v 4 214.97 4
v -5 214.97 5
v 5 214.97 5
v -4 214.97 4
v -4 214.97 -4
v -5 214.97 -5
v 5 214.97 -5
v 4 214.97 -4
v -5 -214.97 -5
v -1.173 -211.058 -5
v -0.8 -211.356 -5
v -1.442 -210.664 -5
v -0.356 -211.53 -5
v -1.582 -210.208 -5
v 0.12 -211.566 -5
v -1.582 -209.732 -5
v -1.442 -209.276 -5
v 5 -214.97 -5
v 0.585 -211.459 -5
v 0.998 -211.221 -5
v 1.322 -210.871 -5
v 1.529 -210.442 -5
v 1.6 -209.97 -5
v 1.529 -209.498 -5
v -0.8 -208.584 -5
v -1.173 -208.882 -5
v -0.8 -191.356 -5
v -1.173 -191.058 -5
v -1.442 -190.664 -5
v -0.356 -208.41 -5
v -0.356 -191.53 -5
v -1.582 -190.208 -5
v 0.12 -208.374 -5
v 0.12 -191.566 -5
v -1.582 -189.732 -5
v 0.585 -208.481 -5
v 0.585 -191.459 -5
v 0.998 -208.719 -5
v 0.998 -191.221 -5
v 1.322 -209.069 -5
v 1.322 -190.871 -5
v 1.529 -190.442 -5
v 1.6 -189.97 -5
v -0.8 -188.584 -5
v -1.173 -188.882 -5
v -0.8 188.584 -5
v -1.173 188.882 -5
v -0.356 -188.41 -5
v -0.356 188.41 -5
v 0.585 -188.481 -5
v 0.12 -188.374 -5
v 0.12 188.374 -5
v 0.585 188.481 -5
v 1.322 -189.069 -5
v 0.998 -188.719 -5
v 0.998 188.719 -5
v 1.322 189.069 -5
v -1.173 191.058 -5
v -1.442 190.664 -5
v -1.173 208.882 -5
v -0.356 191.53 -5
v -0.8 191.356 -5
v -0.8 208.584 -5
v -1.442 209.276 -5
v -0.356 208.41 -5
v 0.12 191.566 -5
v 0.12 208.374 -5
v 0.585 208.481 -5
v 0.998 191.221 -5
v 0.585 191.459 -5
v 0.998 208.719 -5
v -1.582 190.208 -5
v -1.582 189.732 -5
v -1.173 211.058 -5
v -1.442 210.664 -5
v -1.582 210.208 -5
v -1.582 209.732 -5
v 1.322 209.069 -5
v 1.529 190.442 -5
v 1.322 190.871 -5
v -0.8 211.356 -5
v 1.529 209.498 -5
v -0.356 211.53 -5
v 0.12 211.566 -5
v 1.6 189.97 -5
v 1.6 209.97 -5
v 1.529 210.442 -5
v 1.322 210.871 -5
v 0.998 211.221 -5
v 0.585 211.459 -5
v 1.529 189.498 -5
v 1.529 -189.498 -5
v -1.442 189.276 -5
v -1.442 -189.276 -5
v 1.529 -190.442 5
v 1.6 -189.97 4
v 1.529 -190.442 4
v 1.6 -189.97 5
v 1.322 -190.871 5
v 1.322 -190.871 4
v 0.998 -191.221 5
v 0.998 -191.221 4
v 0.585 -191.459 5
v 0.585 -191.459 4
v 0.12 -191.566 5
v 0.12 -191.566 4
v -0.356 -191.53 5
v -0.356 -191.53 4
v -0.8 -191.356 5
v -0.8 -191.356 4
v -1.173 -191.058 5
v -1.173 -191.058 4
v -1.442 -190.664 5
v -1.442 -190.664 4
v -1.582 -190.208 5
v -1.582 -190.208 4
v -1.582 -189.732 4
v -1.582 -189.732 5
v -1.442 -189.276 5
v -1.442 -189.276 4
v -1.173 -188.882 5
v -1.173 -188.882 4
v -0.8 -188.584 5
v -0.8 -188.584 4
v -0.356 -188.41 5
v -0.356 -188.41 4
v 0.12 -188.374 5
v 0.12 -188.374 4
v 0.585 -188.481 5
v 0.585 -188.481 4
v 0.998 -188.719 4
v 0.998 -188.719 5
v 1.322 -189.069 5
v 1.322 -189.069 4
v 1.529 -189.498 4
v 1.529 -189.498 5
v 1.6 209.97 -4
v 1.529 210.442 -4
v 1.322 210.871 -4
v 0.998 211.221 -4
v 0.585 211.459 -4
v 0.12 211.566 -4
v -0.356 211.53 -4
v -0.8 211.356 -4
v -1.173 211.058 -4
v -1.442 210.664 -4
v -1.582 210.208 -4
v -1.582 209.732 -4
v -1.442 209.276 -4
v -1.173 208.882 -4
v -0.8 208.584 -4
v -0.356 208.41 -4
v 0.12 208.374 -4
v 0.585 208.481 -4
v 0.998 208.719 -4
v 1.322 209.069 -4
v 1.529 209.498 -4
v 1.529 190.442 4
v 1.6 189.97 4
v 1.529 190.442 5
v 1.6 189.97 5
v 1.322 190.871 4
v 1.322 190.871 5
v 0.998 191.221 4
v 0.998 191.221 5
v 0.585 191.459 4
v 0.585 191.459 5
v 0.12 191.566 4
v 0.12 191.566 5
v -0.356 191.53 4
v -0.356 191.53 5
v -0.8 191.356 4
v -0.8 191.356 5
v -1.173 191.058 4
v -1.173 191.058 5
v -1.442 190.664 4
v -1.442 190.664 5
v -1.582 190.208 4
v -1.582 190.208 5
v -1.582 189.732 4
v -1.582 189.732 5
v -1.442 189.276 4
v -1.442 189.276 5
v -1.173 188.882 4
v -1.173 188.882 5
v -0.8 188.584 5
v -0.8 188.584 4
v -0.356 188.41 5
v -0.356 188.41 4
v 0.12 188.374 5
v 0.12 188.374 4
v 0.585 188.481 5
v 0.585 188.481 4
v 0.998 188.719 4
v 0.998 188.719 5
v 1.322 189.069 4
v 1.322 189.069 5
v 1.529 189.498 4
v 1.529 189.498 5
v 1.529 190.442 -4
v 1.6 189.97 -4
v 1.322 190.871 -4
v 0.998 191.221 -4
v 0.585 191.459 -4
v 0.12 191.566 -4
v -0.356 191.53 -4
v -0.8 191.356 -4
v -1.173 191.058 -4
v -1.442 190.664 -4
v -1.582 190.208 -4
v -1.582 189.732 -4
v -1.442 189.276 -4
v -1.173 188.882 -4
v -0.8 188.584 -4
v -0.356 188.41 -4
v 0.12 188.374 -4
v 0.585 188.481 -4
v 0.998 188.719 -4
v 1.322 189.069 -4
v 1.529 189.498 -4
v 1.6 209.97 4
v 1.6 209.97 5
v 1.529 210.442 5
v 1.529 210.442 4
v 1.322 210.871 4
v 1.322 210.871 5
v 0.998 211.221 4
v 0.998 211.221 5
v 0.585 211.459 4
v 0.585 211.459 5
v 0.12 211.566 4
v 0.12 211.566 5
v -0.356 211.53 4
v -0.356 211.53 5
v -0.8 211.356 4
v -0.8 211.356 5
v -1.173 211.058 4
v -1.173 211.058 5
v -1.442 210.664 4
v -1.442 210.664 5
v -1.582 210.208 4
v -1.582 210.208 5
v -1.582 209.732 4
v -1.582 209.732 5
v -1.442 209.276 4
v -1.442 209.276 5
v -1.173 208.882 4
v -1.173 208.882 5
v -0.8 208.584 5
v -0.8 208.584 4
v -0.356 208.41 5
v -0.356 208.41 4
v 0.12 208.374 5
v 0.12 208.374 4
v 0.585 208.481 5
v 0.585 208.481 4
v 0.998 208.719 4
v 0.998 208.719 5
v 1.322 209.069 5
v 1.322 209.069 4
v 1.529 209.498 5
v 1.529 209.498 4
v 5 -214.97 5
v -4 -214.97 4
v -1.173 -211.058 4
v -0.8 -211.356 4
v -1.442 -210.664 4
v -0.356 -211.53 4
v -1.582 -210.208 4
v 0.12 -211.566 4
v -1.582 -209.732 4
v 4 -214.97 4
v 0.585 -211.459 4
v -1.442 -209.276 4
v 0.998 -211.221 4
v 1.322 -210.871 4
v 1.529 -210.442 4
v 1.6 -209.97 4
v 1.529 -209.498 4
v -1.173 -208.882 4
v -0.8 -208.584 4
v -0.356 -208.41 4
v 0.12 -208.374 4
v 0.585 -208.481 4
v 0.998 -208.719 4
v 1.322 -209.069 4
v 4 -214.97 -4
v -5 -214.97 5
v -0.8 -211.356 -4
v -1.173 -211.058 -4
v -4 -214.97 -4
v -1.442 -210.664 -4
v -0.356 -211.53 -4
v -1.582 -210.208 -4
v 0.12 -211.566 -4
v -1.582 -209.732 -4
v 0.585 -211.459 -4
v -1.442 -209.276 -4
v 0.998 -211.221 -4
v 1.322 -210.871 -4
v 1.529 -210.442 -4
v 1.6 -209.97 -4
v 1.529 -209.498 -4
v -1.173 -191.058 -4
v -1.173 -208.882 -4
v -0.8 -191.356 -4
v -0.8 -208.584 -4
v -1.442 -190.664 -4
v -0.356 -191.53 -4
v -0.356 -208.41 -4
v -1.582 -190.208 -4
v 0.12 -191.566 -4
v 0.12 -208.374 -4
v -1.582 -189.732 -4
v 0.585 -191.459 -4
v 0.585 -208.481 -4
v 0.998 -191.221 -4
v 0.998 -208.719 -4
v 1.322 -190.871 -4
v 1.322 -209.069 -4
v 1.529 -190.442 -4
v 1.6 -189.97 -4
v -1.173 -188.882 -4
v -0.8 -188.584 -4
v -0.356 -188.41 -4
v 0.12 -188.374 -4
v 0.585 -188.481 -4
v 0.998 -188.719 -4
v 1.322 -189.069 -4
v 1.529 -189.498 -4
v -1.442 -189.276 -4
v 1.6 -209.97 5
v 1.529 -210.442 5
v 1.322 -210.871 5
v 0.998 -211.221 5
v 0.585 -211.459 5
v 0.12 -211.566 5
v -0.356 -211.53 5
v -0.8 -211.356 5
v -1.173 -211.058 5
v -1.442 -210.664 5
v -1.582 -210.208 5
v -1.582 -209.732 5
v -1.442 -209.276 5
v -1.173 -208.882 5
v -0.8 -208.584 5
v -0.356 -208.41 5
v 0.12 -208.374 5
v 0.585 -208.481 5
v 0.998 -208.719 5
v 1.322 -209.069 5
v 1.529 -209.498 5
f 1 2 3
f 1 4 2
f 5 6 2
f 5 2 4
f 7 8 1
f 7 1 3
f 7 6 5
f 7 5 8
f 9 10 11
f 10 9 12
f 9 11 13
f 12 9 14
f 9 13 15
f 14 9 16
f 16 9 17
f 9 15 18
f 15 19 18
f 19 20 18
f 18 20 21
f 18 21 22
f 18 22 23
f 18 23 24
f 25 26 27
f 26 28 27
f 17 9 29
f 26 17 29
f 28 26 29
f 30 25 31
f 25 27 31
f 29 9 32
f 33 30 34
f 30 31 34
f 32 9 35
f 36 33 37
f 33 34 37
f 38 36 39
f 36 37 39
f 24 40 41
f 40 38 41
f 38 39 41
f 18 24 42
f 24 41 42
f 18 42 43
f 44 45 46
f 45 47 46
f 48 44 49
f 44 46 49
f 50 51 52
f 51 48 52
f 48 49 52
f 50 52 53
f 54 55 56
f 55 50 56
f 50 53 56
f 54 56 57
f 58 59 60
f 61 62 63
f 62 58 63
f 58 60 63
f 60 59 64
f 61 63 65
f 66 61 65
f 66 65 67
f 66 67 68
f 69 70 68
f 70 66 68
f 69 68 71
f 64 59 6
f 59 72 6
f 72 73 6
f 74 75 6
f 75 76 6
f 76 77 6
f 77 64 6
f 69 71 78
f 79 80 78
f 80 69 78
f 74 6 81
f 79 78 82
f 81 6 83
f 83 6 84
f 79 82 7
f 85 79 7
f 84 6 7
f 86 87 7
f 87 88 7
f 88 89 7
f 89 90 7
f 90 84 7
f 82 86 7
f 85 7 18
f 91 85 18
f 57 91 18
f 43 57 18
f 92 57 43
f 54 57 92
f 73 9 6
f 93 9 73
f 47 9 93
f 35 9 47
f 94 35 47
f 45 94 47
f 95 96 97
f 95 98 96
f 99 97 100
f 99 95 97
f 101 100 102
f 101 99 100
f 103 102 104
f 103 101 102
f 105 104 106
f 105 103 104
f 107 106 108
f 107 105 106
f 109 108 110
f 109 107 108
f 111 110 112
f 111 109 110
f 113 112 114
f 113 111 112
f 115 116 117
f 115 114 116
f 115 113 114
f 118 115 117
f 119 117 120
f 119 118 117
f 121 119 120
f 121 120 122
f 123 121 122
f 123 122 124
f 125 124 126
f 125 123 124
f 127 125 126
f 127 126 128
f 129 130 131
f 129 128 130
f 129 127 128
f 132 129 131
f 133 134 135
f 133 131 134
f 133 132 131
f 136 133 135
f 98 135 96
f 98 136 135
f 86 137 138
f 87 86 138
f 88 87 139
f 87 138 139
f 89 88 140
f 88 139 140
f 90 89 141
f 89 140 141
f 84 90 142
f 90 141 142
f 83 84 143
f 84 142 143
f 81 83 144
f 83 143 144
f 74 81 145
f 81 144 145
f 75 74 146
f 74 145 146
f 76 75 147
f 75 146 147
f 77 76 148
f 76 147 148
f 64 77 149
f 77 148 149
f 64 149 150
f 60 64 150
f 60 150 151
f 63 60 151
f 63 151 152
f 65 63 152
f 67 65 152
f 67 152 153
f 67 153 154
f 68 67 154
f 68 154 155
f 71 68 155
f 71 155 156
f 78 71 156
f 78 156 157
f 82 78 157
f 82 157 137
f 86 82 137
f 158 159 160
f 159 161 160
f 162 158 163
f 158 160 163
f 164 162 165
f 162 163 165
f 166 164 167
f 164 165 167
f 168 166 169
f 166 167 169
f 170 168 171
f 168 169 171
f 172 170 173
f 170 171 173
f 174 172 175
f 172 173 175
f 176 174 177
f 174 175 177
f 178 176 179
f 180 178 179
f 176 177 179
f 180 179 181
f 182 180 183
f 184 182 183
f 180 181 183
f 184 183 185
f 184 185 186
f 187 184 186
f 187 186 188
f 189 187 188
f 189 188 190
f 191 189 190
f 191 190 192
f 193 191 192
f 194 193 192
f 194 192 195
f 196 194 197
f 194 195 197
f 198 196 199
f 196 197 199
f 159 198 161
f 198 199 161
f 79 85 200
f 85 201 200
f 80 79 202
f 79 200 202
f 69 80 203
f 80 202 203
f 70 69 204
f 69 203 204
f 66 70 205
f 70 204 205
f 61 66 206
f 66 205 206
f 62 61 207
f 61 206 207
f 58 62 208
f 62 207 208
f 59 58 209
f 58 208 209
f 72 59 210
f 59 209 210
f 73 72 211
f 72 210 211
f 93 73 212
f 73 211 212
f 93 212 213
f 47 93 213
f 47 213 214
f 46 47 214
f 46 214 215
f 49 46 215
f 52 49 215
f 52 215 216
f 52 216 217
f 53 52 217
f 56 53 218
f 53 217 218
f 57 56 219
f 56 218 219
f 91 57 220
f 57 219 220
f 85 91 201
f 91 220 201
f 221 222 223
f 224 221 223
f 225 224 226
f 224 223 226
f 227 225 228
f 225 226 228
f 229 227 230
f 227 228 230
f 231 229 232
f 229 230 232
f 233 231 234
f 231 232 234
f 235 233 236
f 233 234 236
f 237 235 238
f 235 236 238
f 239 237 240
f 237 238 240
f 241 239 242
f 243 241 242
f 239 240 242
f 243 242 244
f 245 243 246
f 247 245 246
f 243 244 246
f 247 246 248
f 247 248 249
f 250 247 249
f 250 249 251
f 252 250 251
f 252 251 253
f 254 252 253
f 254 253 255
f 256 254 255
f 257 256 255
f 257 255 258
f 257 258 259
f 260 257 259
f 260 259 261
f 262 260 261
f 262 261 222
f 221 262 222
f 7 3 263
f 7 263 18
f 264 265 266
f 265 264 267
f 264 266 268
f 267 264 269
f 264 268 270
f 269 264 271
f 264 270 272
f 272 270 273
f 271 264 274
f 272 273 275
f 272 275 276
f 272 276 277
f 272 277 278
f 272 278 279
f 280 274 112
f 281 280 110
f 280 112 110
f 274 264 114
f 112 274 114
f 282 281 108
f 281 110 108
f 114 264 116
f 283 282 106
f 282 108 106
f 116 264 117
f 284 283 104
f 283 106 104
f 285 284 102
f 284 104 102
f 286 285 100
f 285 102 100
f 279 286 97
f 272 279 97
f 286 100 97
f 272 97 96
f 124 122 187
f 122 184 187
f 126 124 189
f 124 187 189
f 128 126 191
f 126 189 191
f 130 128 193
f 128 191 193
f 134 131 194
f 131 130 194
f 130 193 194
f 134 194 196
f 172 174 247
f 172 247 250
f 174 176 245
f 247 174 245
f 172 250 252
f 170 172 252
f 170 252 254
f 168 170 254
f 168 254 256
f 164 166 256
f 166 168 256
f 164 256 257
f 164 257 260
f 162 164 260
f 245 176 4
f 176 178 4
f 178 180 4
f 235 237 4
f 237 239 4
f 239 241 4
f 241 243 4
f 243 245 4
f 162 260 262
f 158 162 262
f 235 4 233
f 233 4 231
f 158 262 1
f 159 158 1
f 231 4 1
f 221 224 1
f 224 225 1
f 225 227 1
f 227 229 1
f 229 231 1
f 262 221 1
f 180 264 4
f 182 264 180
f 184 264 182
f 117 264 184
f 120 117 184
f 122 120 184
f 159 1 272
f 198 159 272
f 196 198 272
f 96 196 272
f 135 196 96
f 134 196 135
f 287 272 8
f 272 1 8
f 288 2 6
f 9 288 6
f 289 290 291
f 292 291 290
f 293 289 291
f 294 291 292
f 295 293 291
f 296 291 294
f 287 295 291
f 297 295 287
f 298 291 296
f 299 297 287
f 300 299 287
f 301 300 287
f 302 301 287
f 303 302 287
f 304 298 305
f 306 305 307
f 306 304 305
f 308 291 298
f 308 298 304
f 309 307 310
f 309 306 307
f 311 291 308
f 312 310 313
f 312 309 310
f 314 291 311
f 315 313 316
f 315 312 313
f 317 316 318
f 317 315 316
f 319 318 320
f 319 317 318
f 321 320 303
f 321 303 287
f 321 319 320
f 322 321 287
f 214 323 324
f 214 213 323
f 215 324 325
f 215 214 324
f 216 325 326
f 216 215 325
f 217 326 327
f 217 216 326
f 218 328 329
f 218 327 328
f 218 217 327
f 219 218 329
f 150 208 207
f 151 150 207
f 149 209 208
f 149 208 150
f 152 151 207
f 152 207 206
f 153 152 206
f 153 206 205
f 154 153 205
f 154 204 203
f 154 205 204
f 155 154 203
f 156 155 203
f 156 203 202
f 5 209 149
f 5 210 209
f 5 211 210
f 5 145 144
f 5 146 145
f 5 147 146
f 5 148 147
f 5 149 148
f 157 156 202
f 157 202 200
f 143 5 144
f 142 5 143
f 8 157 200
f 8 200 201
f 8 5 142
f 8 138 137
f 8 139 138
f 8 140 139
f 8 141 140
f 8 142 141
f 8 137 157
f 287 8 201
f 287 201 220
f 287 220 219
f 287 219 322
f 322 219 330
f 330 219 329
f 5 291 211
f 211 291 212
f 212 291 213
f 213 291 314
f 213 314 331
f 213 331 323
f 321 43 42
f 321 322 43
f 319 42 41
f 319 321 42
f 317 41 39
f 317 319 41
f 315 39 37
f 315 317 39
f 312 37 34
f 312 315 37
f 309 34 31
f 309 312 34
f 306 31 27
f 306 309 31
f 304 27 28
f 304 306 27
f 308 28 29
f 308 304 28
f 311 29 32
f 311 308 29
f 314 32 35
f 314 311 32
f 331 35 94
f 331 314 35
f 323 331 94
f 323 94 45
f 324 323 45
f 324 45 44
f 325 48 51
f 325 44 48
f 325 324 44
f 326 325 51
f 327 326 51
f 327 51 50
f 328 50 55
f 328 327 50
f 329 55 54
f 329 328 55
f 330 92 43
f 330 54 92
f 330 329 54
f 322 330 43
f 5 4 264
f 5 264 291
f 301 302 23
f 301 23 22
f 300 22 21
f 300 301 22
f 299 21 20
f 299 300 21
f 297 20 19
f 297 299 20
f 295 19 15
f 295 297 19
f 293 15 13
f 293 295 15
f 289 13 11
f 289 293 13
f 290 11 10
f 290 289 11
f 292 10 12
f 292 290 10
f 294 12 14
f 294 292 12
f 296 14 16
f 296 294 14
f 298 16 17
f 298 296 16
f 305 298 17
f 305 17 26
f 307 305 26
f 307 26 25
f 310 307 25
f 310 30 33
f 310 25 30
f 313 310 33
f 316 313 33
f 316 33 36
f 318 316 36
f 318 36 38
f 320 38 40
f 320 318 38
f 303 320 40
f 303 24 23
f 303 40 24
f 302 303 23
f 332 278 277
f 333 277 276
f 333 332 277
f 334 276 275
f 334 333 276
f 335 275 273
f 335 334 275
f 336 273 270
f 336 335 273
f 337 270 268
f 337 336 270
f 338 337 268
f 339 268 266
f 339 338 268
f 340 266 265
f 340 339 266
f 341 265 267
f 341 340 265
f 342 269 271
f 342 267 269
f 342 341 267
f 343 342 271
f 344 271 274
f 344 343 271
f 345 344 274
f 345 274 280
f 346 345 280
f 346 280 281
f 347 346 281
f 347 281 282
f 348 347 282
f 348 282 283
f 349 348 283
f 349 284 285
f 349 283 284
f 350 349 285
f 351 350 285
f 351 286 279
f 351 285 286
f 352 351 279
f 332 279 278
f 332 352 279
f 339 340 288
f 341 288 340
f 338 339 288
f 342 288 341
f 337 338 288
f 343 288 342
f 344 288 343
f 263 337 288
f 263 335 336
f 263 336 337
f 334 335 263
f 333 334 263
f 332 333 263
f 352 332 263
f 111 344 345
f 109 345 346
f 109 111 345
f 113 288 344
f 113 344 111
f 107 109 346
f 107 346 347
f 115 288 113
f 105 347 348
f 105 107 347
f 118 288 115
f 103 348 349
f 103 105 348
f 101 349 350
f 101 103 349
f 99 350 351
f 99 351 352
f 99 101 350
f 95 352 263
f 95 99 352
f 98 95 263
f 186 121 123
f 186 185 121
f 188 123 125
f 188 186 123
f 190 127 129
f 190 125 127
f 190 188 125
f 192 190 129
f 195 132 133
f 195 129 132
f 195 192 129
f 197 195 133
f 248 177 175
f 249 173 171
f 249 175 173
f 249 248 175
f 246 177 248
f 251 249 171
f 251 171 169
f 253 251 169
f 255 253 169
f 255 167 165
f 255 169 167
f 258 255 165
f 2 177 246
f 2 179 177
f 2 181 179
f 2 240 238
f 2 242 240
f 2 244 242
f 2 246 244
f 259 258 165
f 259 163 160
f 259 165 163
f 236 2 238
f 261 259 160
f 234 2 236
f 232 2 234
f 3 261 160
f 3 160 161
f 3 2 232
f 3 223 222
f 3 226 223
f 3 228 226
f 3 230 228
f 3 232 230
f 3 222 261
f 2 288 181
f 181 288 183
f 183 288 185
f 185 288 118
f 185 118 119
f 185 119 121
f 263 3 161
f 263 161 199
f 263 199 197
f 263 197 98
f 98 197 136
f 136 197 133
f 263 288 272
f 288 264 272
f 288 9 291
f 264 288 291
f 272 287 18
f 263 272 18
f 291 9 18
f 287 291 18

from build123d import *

# Parameters (mm, degrees)
SKETCH_1_W          = 10
SKETCH_1_H          = 10
SKETCH_1_W_2        = 8
SKETCH_1_H_2        = 8
EXTRUDE_1_DEPTH     = 214.97
SKETCH_2_R          = 1.6
CUT_EXTRUDE_1_DEPTH = 213.715


with BuildPart() as part:
    # ｽｹｯﾁ1 → ﾎﾞｽ - 押し出し1 (new, symmetric)
    with BuildSketch(Plane(origin=(0, 0, 0), x_dir=(1, 0, 0), z_dir=(0, 1, 0))):
        Rectangle(SKETCH_1_W, SKETCH_1_H)
        Rectangle(SKETCH_1_W_2, SKETCH_1_H_2, mode=Mode.SUBTRACT)
    extrude(amount=EXTRUDE_1_DEPTH, both=True)

    # ｽｹｯﾁ2 → ｶｯﾄ - 押し出し1 (cut, symmetric)
    with BuildSketch(Plane.XY.offset(5)):
        with Locations((0, 209.97)):
            Circle(SKETCH_2_R)
        with Locations((0, 189.97)):
            Circle(SKETCH_2_R)
    cut_extrude_1 = extrude(amount=CUT_EXTRUDE_1_DEPTH, both=True, mode=Mode.SUBTRACT)

    # ﾐﾗｰ1: ｶｯﾄ - 押し出し1 across plane
    add(cut_extrude_1.mirror(Plane.ZX), mode=Mode.SUBTRACT)


solid = part.part
